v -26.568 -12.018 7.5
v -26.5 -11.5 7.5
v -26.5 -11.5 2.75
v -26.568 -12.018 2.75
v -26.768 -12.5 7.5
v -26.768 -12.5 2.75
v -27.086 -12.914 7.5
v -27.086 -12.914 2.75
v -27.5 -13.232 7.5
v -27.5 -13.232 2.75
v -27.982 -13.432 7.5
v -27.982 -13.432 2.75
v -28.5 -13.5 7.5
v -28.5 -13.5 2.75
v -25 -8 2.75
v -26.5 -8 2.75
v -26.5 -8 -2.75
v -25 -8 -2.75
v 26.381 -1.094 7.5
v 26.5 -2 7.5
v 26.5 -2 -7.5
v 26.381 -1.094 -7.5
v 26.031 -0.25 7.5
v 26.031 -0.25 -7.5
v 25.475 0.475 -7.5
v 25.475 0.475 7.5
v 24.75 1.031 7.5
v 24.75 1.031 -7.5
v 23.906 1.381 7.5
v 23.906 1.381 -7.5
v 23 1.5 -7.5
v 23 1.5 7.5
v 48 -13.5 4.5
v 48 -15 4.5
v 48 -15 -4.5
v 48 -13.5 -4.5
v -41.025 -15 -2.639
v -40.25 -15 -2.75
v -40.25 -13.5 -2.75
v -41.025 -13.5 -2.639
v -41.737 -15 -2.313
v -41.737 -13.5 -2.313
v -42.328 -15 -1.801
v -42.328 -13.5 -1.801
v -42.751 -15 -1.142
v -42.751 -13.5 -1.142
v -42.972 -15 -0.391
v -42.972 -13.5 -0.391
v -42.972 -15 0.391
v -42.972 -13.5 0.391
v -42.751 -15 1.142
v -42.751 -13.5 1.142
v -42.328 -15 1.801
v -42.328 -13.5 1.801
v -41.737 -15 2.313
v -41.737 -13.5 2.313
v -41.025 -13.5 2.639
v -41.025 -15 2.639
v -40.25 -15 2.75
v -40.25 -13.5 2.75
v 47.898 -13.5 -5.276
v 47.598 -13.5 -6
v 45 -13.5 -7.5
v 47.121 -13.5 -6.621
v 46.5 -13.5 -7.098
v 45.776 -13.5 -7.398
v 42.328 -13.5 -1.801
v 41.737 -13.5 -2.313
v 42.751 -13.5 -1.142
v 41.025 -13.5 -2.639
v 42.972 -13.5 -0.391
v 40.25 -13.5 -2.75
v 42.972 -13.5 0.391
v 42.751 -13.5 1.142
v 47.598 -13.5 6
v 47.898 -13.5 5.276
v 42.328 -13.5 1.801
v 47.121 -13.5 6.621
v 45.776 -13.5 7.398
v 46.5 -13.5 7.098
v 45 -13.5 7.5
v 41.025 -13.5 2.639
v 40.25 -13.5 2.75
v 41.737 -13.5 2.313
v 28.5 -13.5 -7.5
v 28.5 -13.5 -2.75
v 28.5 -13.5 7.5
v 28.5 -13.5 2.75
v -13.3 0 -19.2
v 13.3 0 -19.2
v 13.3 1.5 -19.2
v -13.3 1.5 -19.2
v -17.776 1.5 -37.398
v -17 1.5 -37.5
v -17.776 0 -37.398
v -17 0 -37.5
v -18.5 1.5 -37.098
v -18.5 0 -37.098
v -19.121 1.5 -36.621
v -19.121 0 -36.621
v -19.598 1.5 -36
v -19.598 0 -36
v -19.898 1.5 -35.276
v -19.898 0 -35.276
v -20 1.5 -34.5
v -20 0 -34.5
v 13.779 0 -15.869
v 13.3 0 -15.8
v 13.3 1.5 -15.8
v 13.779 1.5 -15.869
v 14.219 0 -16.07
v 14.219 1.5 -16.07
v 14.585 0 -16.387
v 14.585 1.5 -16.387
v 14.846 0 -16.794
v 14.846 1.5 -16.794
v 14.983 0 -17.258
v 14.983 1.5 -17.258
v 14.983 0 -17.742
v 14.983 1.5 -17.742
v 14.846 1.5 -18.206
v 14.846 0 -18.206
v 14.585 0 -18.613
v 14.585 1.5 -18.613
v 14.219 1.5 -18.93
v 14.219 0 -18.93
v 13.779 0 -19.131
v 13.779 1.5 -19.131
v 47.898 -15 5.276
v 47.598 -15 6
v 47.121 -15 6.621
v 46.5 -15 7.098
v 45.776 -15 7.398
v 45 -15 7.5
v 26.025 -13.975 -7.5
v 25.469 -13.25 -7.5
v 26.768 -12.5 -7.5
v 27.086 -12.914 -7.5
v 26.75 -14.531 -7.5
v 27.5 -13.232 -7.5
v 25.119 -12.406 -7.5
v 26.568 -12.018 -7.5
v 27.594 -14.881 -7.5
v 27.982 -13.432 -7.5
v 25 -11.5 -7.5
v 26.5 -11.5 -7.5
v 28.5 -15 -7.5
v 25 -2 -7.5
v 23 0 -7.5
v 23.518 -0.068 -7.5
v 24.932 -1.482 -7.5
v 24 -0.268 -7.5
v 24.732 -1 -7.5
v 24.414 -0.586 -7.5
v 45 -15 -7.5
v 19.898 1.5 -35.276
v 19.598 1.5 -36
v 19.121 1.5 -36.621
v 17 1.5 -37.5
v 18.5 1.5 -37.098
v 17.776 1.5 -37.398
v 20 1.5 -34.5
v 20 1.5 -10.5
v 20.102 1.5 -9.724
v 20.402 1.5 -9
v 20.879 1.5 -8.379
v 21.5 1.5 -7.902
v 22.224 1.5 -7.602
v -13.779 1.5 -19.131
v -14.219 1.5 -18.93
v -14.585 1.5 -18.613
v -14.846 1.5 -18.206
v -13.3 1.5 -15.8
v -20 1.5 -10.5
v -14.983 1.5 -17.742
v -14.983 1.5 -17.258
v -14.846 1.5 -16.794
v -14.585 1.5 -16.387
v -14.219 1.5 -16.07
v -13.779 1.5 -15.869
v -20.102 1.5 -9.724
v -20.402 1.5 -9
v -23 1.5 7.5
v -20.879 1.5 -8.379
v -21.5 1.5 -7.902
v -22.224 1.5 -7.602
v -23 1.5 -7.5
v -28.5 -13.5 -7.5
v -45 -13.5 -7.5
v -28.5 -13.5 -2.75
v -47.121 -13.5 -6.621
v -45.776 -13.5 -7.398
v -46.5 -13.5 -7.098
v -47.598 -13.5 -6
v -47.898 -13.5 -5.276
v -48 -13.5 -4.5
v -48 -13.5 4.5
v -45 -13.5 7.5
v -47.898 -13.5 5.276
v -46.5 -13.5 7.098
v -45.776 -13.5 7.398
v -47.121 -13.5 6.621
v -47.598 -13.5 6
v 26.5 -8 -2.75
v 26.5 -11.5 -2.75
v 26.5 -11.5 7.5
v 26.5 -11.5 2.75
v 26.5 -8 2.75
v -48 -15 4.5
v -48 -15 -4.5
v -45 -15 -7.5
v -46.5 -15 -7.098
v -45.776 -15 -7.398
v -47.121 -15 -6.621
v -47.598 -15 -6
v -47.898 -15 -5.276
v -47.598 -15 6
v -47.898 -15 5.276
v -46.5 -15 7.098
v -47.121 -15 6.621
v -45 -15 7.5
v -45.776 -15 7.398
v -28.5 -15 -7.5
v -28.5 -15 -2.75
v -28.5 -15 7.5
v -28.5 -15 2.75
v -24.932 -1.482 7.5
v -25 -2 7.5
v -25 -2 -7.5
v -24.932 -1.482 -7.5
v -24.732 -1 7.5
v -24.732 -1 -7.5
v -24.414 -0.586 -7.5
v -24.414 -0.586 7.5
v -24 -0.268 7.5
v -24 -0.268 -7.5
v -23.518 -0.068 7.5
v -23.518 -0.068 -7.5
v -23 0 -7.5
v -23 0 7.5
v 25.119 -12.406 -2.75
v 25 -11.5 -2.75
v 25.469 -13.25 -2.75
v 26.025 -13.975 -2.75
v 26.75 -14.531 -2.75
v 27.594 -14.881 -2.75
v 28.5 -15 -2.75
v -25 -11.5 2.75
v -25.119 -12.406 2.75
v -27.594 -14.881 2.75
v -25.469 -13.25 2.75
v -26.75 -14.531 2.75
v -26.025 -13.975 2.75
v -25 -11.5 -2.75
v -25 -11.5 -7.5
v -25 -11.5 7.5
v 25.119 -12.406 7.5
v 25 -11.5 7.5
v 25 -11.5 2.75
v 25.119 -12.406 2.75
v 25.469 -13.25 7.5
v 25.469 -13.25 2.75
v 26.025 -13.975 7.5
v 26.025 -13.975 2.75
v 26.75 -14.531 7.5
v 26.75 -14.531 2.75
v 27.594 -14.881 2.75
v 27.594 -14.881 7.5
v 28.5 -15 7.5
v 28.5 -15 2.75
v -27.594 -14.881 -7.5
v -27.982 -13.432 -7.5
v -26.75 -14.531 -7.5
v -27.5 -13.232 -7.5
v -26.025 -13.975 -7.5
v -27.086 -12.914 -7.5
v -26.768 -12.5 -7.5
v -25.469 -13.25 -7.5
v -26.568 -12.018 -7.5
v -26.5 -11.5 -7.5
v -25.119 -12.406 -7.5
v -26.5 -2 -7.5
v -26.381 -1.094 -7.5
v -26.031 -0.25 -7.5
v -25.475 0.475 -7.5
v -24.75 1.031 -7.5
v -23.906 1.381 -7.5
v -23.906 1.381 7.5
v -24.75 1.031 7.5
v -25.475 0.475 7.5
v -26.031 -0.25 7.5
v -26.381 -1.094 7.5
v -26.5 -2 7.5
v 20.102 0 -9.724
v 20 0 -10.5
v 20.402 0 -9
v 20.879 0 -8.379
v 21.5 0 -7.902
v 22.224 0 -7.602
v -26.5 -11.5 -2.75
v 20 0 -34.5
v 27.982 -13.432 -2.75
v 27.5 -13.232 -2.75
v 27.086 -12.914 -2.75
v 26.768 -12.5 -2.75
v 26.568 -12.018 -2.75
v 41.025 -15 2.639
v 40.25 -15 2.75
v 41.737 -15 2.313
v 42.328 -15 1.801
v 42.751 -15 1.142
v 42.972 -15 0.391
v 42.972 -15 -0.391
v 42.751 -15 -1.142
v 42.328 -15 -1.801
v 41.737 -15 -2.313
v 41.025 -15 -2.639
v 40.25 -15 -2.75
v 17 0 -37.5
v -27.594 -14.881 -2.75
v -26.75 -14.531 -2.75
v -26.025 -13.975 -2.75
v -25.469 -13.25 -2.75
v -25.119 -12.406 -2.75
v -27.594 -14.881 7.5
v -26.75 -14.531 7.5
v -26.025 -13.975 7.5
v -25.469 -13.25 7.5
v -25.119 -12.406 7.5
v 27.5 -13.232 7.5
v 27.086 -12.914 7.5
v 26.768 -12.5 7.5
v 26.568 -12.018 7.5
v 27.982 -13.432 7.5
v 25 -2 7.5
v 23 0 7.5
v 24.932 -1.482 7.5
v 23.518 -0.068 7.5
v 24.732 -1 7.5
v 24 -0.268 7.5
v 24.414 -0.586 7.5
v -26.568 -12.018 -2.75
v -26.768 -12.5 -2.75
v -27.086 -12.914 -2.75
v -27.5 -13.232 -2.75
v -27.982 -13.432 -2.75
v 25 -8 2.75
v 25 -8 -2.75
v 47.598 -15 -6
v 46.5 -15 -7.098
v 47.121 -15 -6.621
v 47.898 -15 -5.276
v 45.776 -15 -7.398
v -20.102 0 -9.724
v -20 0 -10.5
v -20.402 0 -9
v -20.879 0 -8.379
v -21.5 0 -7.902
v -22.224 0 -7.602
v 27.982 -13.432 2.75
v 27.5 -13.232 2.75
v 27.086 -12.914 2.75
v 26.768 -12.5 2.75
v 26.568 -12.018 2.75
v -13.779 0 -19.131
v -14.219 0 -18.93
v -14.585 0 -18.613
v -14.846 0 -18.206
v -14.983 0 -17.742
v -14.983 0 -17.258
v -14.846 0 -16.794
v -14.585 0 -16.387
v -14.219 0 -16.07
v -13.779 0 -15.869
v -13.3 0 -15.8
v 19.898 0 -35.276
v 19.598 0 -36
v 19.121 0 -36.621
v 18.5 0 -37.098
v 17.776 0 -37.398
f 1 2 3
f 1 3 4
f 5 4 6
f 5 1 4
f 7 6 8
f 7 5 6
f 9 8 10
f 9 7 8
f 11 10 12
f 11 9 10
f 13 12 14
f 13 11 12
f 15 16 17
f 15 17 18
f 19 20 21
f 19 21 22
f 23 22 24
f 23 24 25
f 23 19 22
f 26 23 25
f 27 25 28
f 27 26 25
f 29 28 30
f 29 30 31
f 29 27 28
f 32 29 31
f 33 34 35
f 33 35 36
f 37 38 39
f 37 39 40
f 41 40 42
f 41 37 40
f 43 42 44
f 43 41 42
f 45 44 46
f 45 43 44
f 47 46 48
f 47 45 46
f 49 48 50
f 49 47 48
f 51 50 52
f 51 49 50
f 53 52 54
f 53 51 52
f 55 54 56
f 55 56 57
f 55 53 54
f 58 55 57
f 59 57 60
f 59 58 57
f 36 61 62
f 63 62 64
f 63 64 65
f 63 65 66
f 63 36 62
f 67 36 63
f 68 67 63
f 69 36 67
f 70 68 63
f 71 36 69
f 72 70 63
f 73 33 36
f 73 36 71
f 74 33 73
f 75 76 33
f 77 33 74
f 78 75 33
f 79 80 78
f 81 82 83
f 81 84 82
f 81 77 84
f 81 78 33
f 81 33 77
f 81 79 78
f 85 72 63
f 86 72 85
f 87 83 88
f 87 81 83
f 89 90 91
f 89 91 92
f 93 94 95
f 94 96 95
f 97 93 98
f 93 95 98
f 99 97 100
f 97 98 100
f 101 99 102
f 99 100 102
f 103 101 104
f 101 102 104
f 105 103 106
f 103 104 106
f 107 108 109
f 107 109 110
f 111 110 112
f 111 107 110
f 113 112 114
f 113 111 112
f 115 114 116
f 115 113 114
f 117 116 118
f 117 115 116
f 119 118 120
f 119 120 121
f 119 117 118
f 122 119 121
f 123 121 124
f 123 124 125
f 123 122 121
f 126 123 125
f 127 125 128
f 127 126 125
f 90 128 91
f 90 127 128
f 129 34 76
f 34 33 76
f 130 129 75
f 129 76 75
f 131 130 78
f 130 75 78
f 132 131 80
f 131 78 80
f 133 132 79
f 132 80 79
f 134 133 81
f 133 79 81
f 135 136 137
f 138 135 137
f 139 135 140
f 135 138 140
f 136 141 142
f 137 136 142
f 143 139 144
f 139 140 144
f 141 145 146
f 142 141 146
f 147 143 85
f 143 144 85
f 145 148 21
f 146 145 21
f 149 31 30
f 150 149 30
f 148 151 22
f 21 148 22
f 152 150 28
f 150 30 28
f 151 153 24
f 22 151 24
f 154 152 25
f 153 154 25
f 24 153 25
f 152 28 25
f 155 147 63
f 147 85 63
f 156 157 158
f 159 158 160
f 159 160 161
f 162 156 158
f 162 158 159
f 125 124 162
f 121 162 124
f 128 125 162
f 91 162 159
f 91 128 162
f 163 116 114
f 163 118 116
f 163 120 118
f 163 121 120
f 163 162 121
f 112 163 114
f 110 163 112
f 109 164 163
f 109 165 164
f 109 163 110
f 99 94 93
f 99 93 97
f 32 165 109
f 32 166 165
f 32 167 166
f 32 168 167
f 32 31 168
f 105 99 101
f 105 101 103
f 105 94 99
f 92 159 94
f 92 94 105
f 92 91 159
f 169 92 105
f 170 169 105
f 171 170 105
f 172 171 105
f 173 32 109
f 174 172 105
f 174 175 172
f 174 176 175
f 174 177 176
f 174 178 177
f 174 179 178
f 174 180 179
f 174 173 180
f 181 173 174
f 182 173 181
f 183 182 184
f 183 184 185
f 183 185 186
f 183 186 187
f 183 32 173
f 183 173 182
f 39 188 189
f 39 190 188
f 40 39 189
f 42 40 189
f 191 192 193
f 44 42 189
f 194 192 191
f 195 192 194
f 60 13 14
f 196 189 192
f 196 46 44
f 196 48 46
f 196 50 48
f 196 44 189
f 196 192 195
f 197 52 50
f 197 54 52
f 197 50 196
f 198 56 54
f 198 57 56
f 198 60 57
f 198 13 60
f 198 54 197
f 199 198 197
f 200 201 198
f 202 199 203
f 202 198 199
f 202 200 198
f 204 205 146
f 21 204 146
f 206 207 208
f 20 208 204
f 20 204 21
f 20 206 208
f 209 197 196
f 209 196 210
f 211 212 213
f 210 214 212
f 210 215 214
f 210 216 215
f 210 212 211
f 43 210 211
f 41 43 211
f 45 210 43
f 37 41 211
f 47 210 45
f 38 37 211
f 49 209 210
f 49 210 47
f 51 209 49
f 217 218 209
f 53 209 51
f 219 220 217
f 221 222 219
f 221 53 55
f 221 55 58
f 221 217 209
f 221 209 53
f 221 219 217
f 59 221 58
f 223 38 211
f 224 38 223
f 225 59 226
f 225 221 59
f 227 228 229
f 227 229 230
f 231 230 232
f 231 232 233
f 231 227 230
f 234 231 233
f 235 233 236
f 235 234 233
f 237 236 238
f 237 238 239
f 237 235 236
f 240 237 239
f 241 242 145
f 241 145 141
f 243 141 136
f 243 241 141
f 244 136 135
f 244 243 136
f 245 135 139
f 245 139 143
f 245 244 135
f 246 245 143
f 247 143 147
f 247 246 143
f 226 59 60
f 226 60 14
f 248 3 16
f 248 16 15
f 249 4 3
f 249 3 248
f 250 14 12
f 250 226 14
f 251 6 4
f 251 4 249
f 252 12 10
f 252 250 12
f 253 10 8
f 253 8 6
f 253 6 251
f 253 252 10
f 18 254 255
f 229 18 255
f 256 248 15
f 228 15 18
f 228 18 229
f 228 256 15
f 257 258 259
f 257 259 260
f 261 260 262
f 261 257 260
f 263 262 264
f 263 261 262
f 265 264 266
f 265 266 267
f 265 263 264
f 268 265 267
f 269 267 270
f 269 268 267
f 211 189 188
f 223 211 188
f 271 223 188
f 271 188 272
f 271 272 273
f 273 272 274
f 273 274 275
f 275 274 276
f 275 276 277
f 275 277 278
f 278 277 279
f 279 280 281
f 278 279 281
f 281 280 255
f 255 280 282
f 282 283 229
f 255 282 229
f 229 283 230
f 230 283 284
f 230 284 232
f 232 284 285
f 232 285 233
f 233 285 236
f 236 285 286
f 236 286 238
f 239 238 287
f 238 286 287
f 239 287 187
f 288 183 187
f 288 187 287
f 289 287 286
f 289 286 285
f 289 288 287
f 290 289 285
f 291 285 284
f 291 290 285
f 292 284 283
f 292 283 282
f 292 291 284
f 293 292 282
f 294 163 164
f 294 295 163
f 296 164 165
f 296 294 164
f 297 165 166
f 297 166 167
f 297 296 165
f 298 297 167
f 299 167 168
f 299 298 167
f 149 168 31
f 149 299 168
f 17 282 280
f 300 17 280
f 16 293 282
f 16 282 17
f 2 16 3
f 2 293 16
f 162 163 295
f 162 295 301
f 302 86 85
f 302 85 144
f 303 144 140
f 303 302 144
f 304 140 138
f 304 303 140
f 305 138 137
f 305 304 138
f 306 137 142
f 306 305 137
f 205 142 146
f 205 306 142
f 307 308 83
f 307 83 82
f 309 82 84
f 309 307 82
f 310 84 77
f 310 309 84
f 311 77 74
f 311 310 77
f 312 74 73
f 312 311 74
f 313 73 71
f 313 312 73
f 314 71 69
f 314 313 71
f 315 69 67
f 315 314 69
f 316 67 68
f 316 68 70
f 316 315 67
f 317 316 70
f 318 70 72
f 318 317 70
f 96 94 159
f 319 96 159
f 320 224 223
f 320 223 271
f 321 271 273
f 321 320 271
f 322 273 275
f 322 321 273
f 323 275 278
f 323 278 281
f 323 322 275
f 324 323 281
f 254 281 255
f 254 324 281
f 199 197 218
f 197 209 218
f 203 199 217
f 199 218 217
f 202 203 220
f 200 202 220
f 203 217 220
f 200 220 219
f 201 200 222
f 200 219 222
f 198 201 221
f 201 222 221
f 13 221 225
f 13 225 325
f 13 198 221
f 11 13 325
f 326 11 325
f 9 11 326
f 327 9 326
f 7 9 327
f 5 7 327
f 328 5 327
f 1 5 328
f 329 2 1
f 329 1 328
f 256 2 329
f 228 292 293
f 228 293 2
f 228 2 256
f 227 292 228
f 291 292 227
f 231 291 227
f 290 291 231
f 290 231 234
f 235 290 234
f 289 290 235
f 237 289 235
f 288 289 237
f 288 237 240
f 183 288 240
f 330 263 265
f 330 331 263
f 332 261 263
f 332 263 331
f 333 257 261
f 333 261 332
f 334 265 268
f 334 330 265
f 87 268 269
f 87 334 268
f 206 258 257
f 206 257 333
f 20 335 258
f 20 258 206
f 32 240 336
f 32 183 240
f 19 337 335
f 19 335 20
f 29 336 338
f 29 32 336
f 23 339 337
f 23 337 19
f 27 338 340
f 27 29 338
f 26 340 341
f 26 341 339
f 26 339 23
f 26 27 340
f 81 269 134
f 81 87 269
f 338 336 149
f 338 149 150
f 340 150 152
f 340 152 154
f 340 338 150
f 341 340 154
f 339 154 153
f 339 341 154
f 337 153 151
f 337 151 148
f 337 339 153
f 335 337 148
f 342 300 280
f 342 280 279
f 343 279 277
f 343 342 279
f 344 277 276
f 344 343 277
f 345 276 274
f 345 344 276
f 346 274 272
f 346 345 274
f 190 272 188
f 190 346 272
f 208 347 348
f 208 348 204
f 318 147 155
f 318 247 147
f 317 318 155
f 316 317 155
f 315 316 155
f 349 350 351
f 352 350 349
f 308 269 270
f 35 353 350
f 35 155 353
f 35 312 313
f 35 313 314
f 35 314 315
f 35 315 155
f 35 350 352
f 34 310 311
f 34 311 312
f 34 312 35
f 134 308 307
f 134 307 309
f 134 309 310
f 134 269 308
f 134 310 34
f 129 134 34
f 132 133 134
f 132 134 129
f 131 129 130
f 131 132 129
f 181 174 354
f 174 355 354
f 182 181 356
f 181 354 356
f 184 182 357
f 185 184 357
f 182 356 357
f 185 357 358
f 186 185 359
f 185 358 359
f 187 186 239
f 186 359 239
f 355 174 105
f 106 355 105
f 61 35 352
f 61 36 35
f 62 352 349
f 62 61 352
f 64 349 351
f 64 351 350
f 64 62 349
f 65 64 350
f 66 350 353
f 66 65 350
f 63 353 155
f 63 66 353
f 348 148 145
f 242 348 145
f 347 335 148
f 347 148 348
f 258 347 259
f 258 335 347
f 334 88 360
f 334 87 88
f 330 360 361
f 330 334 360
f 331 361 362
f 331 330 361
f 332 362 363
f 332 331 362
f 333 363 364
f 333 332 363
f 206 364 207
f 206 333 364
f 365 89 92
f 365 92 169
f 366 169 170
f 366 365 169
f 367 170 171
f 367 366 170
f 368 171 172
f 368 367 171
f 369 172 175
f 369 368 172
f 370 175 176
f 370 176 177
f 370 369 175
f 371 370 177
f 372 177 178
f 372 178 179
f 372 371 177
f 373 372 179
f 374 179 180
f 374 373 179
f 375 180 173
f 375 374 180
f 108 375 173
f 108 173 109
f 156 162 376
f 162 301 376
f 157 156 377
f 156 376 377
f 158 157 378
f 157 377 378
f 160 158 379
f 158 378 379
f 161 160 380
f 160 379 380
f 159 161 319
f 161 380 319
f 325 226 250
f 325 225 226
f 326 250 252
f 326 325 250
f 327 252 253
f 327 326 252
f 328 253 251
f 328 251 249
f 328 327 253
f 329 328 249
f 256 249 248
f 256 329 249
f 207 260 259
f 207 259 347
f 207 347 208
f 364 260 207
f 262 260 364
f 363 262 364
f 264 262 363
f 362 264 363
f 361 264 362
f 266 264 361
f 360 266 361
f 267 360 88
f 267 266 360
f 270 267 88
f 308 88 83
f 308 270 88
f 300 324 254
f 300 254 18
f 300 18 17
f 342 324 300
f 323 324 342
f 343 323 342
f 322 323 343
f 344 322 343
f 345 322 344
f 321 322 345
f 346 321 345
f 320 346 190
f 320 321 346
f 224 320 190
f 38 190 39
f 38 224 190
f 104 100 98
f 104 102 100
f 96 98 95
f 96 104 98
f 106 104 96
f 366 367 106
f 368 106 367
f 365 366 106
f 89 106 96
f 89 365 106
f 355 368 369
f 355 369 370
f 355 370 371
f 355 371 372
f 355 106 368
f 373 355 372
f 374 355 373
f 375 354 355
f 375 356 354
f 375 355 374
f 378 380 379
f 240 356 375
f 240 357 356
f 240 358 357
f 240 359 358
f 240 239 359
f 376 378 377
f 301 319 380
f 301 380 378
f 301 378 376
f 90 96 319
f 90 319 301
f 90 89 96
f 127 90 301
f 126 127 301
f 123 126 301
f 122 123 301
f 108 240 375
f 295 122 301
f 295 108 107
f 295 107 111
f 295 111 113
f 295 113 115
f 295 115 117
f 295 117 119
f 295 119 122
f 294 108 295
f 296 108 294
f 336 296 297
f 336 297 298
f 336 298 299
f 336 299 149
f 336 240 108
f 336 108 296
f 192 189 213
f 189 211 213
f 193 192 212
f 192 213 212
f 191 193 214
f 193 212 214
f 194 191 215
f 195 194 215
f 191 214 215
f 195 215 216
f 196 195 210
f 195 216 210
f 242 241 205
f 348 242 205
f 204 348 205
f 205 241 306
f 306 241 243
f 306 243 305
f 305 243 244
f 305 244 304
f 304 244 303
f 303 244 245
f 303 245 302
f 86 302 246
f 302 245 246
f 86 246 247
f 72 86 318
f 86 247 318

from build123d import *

# Parameters (mm, degrees)
ODGI_CIE_BAZOWE1_DEPTH      = 7.5
SZCZELINA_START             = -15
SZCZELINA_POD_RUB_M51_DEPTH = 1.5
SZKIC8_W                    = 40
SZKIC8_H                    = 30
WYPUST1_DEPTH               = 1.5
SZCZELINA_POD_RUB_M31_DEPTH = 1.5
SZKIC13_W                   = 4.75
SZKIC13_H                   = 5.5
WYTNIJ_WYCI_GNI_CIE1_DEPTH  = 7
ZAOKR_GLENIE1_R             = 3


# Read off the part's stored shape, not the designer's step: Szczelina pod śrubę M51, Szczelina pod śrubę M31
# Sheet-metal steps are written as plain solids
with BuildPart() as part:
    # Szkic1 → Odgięcie bazowe1 (new, symmetric)
    with BuildSketch(Plane.XY):
        with BuildLine():
            Line((-48, -15), (-28.5, -15))
            ThreePointArc((-28.5, -15), (-26.025126266, -13.974873734), (-25, -11.5))
            Line((-25, -11.5), (-25, -2))
            ThreePointArc((-25, -2), (-24.414213562, -0.585786438), (-23, 0))
            Line((-23, 0), (23, 0))
            ThreePointArc((23, 0), (24.414213562, -0.585786438), (25, -2))
            Line((25, -2), (25, -11.5))
            ThreePointArc((25, -11.5), (26.025126266, -13.974873734), (28.5, -15))
            Line((28.5, -15), (48, -15))
            Line((48, -15), (48, -13.5))
            Line((48, -13.5), (28.5, -13.5))
            ThreePointArc((28.5, -13.5), (27.085786438, -12.914213562), (26.5, -11.5))
            Line((26.5, -11.5), (26.5, -2))
            ThreePointArc((26.5, -2), (25.474873734, 0.474873734), (23, 1.5))
            Line((23, 1.5), (-23, 1.5))
            ThreePointArc((-23, 1.5), (-25.474873734, 0.474873734), (-26.5, -2))
            Line((-26.5, -2), (-26.5, -11.5))
            ThreePointArc((-26.5, -11.5), (-27.085786438, -12.914213562), (-28.5, -13.5))
            Line((-28.5, -13.5), (-48, -13.5))
            Line((-48, -13.5), (-48, -15))
        make_face()
    extrude(amount=ODGI_CIE_BAZOWE1_DEPTH, both=True)

    # Szczelina pod śrubę M51 outline → Szczelina pod śrubę M51 (cut)
    with BuildSketch(Plane(origin=(0, 0, 0), x_dir=(1, 0, 0), z_dir=(0, 1, 0)).offset(SZCZELINA_START)):
        with BuildLine():
            Line((29.75, -2.75), (40.25, -2.75))
            ThreePointArc((40.25, -2.75), (43, 0), (40.25, 2.75))
            Line((40.25, 2.75), (29.75, 2.75))
            ThreePointArc((29.75, 2.75), (27, 0), (29.75, -2.75))
        make_face()
        with BuildLine():
            ThreePointArc((-29.75, -2.75), (-27, 0), (-29.75, 2.75))
            Line((-29.75, 2.75), (-40.25, 2.75))
            ThreePointArc((-40.25, 2.75), (-43, 0), (-40.25, -2.75))
            Line((-40.25, -2.75), (-29.75, -2.75))
        make_face()
    extrude(amount=SZCZELINA_POD_RUB_M51_DEPTH, mode=Mode.SUBTRACT)

    # Szkic8 → Wypust1 (add)
    with BuildSketch(Plane(origin=(0, 1.5, 0), x_dir=(1, 0, 0), z_dir=(0, 1, 0))):
        with Locations((0, 22.5)):
            Rectangle(SZKIC8_W, SZKIC8_H)
    extrude(amount=-WYPUST1_DEPTH)

    # Szczelina pod śrubę M31 outline → Szczelina pod śrubę M31 (cut)
    with BuildSketch(Plane(origin=(0, 0, 0), x_dir=(1, 0, 0), z_dir=(0, 1, 0))):
        with BuildLine():
            Line((-13.3, 15.8), (13.3, 15.8))
            ThreePointArc((13.3, 15.8), (15, 17.5), (13.3, 19.2))
            Line((13.3, 19.2), (-13.3, 19.2))
            ThreePointArc((-13.3, 19.2), (-15, 17.5), (-13.3, 15.8))
        make_face()
    extrude(amount=SZCZELINA_POD_RUB_M31_DEPTH, mode=Mode.SUBTRACT)

    # Szkic13 → Wytnij-wyciągnięcie1 (cut)
    with BuildSketch(Plane.XZ.offset(15)):
        with Locations((-27.375, 0)):
            Rectangle(SZKIC13_W, SZKIC13_H)
        with Locations((27.375, 0)):
            Rectangle(SZKIC13_W, SZKIC13_H)
    extrude(amount=-WYTNIJ_WYCI_GNI_CIE1_DEPTH, mode=Mode.SUBTRACT)

    # Zaokrąglenie1
    zaokr_glenie1_edges = [part.edges().sort_by_distance(p)[0] for p in [
        (48, -14.25, 7.5),
        (48, -14.25, -7.5),
        (20, 0.75, -37.5),
        (-20, 0.75, -37.5),
        (-48, -14.25, -7.5),
        (-48, -14.25, 7.5),
        (20, 0.75, -7.5),
        (-20, 0.75, -7.5),
    ]]
    fillet(zaokr_glenie1_edges, radius=ZAOKR_GLENIE1_R)


solid = part.part
